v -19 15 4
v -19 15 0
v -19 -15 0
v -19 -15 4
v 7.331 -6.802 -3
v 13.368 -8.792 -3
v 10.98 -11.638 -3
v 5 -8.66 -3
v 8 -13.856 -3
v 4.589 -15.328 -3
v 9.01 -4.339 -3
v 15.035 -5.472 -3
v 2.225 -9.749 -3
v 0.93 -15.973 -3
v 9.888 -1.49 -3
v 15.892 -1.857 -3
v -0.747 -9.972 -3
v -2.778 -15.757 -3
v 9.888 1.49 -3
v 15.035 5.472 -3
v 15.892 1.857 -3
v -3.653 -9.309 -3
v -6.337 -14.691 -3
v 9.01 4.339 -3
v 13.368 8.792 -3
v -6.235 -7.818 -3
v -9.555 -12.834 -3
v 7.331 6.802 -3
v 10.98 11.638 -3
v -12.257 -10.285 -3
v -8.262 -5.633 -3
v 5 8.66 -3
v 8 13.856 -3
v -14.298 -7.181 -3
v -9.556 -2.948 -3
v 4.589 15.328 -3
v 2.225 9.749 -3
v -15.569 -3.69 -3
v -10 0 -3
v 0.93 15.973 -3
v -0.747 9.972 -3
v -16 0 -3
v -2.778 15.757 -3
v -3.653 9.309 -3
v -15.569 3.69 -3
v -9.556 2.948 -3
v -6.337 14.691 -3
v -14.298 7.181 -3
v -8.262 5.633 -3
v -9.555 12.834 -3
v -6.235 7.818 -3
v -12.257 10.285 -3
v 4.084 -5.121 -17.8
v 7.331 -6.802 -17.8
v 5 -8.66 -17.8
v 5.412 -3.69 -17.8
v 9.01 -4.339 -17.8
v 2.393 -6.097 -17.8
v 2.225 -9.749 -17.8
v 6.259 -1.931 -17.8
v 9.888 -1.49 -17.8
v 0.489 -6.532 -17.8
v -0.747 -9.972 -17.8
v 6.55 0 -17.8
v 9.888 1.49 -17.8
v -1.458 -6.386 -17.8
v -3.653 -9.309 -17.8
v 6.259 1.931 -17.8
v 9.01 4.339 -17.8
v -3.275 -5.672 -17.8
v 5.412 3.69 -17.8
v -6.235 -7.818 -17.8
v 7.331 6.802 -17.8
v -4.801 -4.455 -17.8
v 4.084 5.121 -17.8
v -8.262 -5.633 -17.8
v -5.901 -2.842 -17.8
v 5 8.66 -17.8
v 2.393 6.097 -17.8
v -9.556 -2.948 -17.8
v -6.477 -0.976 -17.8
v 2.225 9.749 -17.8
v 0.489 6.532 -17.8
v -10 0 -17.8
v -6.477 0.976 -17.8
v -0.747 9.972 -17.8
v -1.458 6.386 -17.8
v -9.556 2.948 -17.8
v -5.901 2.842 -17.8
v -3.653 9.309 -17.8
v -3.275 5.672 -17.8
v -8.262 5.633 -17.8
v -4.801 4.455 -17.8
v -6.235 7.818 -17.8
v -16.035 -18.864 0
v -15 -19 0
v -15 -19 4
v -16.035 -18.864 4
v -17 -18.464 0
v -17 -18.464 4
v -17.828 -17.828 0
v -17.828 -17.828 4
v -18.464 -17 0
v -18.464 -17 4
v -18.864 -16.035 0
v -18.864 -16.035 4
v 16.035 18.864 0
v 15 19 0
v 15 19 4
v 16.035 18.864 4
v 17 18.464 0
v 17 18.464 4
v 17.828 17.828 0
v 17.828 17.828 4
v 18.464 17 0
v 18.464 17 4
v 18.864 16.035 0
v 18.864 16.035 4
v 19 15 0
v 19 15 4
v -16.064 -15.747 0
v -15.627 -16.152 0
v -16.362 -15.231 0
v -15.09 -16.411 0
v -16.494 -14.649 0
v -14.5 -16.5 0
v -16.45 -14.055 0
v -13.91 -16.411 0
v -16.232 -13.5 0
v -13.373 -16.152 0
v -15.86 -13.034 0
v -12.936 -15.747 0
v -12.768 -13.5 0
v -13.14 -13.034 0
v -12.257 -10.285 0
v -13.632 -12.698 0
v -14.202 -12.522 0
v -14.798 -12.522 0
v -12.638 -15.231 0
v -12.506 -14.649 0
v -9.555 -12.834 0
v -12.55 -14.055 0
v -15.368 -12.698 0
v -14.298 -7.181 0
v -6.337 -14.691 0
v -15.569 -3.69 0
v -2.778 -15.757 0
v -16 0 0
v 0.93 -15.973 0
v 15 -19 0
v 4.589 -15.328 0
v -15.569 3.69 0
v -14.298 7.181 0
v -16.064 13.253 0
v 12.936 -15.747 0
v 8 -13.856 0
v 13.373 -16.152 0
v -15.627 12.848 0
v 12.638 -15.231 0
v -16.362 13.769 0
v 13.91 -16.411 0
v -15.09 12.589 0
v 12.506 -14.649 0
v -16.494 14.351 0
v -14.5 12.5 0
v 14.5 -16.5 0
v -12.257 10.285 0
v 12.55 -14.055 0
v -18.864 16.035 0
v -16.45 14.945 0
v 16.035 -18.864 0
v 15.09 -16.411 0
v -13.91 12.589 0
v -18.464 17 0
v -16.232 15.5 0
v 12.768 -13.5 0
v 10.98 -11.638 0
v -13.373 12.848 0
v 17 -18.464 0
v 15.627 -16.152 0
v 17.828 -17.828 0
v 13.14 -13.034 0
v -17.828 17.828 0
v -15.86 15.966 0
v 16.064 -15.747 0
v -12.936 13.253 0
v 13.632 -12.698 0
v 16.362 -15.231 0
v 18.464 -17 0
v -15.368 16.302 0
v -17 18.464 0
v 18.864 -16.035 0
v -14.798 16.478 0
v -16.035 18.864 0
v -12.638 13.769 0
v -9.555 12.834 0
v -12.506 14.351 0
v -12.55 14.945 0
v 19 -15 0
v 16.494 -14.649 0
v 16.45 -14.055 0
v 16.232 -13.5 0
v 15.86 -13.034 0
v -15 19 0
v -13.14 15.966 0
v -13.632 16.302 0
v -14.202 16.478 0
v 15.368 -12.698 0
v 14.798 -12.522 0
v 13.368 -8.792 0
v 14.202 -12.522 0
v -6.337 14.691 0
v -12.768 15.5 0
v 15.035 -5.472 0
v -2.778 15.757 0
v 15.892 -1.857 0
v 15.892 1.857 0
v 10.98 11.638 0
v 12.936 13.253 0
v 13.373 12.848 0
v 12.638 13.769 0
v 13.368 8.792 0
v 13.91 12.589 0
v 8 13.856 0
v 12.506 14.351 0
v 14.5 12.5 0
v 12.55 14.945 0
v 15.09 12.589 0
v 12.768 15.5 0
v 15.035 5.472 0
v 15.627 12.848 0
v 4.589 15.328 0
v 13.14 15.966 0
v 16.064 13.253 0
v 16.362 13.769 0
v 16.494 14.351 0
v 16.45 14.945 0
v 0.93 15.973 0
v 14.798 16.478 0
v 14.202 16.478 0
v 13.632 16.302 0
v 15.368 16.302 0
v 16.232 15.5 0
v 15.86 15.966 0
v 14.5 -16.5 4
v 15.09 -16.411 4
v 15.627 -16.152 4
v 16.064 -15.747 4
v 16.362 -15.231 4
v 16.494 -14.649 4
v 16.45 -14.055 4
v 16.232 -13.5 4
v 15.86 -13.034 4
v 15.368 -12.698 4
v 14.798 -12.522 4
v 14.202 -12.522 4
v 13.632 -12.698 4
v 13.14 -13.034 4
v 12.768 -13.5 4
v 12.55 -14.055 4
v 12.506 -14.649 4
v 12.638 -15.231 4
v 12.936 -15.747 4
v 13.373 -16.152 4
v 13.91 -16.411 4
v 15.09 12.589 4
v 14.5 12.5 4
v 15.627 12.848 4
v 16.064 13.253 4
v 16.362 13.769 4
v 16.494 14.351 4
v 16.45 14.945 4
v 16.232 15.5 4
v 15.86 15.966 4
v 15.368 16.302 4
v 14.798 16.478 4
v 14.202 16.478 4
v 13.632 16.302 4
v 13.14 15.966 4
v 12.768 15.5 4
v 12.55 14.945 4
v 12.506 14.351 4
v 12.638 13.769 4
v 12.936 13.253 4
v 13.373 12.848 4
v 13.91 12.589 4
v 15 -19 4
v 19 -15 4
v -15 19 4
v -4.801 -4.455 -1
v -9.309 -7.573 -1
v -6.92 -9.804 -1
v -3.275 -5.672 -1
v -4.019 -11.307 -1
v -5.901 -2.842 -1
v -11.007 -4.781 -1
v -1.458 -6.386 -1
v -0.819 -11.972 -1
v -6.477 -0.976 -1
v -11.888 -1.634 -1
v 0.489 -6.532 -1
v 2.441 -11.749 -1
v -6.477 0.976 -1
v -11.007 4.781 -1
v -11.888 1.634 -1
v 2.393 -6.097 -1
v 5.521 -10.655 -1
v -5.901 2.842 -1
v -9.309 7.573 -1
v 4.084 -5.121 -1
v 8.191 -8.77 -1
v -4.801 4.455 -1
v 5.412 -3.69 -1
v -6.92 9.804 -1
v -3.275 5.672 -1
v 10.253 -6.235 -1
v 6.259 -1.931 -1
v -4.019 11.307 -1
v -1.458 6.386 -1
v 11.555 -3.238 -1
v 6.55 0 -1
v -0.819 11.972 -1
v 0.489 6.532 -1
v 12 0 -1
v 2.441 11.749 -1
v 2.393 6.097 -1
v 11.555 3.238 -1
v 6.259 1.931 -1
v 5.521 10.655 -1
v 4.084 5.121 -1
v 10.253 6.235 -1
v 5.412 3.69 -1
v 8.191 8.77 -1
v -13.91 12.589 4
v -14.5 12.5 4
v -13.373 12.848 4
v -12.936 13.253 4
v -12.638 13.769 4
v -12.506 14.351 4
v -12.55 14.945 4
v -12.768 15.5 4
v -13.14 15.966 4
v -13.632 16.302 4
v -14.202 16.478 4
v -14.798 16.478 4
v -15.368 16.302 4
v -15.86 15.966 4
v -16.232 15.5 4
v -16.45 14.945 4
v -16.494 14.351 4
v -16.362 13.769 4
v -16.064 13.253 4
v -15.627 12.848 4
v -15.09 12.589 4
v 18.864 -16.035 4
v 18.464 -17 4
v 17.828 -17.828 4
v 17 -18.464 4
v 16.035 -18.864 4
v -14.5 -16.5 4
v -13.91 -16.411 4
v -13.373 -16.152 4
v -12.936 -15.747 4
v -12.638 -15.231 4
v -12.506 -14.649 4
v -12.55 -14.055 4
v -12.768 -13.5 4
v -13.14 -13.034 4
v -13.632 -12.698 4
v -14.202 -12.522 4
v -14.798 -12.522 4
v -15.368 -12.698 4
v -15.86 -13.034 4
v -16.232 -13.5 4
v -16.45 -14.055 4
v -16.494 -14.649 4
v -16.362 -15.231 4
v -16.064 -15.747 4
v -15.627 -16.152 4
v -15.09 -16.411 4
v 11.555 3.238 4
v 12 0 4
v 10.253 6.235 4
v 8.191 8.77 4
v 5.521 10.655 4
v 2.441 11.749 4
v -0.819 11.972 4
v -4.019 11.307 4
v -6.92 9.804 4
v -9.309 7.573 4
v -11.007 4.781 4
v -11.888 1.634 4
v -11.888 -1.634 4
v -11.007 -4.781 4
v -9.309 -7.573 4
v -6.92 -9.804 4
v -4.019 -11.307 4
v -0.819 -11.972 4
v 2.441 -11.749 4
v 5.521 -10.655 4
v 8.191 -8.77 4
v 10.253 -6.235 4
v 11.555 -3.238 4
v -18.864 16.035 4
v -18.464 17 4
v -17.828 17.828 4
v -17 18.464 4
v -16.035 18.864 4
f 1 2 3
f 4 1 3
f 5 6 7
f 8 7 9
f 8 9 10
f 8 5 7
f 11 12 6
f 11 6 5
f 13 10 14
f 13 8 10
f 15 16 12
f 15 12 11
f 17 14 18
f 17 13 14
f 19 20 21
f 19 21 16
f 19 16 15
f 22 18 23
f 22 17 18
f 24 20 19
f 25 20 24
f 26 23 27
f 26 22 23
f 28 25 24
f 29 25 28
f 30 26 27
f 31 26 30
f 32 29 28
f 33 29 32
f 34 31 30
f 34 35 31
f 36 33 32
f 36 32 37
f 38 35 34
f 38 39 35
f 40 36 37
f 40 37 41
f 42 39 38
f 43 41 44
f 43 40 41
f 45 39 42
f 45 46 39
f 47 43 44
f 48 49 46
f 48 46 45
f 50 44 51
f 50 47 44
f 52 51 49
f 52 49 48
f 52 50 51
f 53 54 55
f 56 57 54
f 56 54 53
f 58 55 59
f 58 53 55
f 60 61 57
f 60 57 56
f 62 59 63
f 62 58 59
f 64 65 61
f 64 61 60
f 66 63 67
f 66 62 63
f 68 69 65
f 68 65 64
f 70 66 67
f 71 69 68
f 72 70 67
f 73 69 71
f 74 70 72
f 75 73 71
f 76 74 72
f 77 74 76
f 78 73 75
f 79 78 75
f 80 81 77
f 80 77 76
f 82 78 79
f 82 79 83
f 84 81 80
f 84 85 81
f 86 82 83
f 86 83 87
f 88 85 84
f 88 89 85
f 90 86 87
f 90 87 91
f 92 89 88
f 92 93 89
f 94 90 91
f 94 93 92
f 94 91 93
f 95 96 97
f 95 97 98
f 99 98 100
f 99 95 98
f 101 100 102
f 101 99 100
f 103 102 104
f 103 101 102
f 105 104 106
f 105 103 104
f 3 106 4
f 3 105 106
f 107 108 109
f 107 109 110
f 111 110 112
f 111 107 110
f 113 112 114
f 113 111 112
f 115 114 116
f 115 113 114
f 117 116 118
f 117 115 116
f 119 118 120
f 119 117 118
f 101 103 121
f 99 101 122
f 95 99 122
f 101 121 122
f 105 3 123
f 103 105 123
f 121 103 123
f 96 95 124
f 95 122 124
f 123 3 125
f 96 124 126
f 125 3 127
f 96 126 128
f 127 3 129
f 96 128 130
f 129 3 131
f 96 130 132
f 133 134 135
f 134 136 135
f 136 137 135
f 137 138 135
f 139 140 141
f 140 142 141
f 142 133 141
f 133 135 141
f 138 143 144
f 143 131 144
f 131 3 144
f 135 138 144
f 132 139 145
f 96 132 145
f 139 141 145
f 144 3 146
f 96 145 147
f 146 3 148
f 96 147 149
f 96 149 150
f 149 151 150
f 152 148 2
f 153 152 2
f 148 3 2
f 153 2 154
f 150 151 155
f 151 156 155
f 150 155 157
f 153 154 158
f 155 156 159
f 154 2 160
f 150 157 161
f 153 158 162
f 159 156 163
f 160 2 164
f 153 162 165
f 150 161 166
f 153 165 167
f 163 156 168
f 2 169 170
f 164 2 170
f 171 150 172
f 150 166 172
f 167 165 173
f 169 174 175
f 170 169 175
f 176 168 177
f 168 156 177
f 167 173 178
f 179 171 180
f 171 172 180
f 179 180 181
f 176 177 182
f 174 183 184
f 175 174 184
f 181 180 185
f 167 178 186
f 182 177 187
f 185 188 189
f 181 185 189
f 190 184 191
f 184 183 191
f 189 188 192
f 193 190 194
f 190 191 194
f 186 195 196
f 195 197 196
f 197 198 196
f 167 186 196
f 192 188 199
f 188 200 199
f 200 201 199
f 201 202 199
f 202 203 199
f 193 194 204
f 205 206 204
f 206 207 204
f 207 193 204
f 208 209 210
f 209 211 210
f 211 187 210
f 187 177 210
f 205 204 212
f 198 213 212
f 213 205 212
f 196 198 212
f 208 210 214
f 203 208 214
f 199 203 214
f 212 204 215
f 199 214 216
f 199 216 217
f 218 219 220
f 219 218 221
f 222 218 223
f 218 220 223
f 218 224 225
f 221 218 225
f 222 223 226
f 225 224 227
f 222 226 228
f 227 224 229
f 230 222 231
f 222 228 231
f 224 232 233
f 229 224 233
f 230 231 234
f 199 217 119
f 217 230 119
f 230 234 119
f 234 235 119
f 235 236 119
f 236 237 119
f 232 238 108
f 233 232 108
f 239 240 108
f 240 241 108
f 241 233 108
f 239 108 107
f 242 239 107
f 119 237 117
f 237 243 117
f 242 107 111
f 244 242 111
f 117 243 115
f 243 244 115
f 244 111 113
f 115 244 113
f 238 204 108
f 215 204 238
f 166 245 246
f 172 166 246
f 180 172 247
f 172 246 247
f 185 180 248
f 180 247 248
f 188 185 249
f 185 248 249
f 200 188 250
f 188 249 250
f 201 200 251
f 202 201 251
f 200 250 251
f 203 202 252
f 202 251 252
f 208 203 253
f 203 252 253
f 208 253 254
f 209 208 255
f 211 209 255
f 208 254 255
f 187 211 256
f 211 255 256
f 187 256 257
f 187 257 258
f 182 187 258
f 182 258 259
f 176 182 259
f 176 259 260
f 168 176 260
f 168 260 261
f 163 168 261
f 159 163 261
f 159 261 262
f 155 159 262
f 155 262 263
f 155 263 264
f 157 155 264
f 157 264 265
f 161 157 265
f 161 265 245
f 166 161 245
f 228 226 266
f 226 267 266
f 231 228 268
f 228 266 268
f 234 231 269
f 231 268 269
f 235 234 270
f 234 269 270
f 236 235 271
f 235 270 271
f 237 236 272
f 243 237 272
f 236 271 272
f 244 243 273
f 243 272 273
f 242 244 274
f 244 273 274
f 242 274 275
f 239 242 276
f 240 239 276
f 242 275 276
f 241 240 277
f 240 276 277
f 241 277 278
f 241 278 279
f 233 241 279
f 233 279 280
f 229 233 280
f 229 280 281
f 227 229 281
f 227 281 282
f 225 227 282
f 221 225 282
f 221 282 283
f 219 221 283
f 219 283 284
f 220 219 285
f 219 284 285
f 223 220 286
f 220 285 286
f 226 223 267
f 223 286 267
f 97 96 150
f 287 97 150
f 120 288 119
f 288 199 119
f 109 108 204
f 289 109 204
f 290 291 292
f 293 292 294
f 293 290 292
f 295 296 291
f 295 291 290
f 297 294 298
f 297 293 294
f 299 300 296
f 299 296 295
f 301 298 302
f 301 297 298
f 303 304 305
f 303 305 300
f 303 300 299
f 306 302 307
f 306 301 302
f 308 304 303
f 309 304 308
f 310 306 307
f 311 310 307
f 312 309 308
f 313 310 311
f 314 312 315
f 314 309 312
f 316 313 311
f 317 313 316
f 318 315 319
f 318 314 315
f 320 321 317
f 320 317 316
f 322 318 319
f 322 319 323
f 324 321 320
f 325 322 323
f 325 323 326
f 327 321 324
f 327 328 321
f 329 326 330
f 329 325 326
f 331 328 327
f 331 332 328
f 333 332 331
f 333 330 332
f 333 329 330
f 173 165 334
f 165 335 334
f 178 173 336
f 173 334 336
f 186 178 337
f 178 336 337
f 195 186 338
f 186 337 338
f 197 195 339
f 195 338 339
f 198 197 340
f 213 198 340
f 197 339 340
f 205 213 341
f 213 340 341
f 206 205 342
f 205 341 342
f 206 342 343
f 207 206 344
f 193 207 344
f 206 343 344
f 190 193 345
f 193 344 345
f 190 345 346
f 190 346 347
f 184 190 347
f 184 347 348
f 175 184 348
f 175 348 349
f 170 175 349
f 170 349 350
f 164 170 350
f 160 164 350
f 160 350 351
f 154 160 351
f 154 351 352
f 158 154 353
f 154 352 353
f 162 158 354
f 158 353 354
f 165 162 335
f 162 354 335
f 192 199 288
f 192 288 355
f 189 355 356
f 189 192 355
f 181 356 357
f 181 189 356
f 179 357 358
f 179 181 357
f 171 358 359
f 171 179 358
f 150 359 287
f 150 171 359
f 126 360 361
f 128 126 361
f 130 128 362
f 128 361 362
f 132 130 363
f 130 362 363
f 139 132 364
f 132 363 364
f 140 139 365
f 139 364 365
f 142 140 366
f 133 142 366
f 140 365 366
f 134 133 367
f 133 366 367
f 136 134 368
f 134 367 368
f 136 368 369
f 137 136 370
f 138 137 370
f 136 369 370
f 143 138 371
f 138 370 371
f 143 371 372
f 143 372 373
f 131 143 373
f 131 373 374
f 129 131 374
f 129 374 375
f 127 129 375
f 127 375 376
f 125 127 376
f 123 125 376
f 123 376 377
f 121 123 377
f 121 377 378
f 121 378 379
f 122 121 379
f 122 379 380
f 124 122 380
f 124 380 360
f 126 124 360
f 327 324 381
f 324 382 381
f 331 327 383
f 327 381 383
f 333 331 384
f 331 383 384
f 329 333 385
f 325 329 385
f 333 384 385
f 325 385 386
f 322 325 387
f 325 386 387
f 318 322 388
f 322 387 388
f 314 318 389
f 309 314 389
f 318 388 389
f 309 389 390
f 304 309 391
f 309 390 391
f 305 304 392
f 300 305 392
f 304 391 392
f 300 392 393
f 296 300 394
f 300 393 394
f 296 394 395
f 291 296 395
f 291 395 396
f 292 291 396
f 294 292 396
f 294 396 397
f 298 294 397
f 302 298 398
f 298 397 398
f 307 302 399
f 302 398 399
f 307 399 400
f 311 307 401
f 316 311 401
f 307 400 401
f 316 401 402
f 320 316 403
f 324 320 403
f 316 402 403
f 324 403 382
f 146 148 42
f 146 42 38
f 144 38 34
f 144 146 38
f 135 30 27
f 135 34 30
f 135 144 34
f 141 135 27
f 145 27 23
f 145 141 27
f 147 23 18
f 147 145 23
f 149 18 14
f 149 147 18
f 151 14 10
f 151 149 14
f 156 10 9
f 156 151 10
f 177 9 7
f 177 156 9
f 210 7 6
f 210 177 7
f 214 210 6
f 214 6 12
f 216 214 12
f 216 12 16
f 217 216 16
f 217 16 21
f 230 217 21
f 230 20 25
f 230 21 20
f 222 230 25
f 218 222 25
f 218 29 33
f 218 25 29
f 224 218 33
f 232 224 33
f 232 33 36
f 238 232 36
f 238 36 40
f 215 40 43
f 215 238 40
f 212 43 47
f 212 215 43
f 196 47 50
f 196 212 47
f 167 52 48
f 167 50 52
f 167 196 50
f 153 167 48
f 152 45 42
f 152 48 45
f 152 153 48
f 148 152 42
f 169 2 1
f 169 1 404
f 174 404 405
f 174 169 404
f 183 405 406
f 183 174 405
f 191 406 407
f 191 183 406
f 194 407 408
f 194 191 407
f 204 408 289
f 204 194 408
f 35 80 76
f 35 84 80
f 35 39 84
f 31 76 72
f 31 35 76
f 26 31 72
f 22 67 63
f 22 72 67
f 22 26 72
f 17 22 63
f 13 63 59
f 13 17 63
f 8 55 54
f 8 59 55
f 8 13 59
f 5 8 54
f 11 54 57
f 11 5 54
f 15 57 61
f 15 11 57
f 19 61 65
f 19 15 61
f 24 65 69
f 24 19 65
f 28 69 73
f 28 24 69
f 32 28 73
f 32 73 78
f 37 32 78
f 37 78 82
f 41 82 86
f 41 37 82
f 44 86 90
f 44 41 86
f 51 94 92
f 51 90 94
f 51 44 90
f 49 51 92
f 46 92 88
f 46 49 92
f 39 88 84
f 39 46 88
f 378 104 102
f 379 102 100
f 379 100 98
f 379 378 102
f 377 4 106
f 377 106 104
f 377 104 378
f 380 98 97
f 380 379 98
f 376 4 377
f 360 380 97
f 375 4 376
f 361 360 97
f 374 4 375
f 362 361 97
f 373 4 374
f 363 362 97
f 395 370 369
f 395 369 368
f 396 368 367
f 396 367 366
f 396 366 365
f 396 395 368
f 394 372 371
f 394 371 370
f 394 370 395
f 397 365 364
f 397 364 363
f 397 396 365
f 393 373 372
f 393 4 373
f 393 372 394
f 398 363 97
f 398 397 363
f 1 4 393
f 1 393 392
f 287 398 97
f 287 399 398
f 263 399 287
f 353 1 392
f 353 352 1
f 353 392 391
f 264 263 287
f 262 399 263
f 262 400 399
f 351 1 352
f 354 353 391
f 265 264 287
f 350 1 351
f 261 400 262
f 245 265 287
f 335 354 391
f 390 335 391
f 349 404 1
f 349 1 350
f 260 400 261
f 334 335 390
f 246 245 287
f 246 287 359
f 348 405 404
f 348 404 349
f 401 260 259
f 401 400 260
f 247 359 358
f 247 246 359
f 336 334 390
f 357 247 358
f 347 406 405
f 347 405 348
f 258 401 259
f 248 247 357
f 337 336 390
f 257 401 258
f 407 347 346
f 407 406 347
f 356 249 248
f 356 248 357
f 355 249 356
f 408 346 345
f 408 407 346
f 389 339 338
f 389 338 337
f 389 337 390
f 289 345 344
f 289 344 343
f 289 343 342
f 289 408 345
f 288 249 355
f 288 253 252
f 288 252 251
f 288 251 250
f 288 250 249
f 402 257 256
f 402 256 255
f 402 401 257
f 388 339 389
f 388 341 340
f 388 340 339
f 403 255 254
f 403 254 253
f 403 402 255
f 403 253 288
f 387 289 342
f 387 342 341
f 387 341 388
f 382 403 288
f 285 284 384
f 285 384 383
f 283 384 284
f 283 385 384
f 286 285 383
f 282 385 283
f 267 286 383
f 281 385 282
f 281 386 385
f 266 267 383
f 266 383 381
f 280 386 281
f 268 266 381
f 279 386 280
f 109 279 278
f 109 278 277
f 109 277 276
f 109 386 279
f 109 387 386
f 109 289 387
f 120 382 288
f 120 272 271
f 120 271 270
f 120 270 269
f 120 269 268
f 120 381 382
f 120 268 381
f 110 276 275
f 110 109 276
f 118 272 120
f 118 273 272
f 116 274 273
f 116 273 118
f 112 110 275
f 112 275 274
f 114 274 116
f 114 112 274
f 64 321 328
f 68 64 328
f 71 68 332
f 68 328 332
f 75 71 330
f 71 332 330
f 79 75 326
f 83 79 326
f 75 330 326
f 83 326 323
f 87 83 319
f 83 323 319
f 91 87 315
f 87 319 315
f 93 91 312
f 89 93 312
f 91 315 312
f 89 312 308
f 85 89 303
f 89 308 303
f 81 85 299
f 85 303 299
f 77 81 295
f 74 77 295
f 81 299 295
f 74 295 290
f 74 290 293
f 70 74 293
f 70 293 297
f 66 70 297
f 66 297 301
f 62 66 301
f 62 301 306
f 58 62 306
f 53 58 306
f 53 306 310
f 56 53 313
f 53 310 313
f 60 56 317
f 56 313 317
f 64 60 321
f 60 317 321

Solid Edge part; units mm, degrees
sketch "Sketch1" plane through (0, 0, 0) normal (0, 0, 1) x (1, 0, 0)
  line L0 (15, 19) -> (-15, 19)
  arc A0 (-15, 19) -> (-19, 15) centre (-15, 15) ccw
  line L1 (-19, 15) -> (-19, -15)
  arc A1 (-19, -15) -> (-15, -19) centre (-15, -15) ccw
  line L2 (-15, -19) -> (15, -19)
  arc A2 (15, -19) -> (19, -15) centre (15, -15) ccw
  line L3 (19, -15) -> (19, 15)
  arc A3 (15, 19) -> (19, 15) centre (15, 15) cw
  dimension "D1" = 38
  dimension "D2" = 38
  dimension "D3" = 4
  dimension "D4" = 19
  dimension "D5" = 19
extrude "Protrusion1" add sketch "Sketch1" along normal blind 4
sketch "Sketch2" plane through (0, 0, 0) normal (0, 0, -1) x (-1, 0, 0)
  circle A0 centre (0, 0) radius 16
  dimension "D1" = 32
extrude "Protrusion2" add sketch "Sketch2" along normal blind 3
sketch "Sketch3" plane through (0, 0, -3) normal (0, 0, -1) x (-1, 0, 0)
  circle A0 centre (0, 0) radius 10
  dimension "D1" = 20
extrude "Protrusion3" add sketch "Sketch3" along normal blind 14.8
sketch "Sketch4" plane through (0, 0, 4) normal (0, 0, 1) x (1, 0, 0)
  circle A0 centre (0, 0) radius 12
  dimension "D1" = 24
extrude "Cutout1" cut sketch "Sketch4" against normal blind 5
sketch "Sketch5" plane through (0, 0, -1) normal (0, 0, 1) x (1, 0, 0)
  circle A0 centre (0, 0) radius 6.55
  dimension "D1" = 13.1
extrude "Cutout2" cut sketch "Sketch5" against normal up to next
hole "Hole1" at (-14.5, 14.5, 4) direction (0, 0, -1) diameter 4 end up to next
hole "Hole2" at (14.5, 14.5, 4) direction (0, 0, -1) diameter 4 end up to next
hole "Hole3" at (14.5, -14.5, 4) direction (0, 0, -1) diameter 4 end up to next
hole "Hole4" at (-14.5, -14.5, 4) direction (0, 0, -1) diameter 4 end up to next
properties part number "PLATE1" material "410 Stainless Steel"
